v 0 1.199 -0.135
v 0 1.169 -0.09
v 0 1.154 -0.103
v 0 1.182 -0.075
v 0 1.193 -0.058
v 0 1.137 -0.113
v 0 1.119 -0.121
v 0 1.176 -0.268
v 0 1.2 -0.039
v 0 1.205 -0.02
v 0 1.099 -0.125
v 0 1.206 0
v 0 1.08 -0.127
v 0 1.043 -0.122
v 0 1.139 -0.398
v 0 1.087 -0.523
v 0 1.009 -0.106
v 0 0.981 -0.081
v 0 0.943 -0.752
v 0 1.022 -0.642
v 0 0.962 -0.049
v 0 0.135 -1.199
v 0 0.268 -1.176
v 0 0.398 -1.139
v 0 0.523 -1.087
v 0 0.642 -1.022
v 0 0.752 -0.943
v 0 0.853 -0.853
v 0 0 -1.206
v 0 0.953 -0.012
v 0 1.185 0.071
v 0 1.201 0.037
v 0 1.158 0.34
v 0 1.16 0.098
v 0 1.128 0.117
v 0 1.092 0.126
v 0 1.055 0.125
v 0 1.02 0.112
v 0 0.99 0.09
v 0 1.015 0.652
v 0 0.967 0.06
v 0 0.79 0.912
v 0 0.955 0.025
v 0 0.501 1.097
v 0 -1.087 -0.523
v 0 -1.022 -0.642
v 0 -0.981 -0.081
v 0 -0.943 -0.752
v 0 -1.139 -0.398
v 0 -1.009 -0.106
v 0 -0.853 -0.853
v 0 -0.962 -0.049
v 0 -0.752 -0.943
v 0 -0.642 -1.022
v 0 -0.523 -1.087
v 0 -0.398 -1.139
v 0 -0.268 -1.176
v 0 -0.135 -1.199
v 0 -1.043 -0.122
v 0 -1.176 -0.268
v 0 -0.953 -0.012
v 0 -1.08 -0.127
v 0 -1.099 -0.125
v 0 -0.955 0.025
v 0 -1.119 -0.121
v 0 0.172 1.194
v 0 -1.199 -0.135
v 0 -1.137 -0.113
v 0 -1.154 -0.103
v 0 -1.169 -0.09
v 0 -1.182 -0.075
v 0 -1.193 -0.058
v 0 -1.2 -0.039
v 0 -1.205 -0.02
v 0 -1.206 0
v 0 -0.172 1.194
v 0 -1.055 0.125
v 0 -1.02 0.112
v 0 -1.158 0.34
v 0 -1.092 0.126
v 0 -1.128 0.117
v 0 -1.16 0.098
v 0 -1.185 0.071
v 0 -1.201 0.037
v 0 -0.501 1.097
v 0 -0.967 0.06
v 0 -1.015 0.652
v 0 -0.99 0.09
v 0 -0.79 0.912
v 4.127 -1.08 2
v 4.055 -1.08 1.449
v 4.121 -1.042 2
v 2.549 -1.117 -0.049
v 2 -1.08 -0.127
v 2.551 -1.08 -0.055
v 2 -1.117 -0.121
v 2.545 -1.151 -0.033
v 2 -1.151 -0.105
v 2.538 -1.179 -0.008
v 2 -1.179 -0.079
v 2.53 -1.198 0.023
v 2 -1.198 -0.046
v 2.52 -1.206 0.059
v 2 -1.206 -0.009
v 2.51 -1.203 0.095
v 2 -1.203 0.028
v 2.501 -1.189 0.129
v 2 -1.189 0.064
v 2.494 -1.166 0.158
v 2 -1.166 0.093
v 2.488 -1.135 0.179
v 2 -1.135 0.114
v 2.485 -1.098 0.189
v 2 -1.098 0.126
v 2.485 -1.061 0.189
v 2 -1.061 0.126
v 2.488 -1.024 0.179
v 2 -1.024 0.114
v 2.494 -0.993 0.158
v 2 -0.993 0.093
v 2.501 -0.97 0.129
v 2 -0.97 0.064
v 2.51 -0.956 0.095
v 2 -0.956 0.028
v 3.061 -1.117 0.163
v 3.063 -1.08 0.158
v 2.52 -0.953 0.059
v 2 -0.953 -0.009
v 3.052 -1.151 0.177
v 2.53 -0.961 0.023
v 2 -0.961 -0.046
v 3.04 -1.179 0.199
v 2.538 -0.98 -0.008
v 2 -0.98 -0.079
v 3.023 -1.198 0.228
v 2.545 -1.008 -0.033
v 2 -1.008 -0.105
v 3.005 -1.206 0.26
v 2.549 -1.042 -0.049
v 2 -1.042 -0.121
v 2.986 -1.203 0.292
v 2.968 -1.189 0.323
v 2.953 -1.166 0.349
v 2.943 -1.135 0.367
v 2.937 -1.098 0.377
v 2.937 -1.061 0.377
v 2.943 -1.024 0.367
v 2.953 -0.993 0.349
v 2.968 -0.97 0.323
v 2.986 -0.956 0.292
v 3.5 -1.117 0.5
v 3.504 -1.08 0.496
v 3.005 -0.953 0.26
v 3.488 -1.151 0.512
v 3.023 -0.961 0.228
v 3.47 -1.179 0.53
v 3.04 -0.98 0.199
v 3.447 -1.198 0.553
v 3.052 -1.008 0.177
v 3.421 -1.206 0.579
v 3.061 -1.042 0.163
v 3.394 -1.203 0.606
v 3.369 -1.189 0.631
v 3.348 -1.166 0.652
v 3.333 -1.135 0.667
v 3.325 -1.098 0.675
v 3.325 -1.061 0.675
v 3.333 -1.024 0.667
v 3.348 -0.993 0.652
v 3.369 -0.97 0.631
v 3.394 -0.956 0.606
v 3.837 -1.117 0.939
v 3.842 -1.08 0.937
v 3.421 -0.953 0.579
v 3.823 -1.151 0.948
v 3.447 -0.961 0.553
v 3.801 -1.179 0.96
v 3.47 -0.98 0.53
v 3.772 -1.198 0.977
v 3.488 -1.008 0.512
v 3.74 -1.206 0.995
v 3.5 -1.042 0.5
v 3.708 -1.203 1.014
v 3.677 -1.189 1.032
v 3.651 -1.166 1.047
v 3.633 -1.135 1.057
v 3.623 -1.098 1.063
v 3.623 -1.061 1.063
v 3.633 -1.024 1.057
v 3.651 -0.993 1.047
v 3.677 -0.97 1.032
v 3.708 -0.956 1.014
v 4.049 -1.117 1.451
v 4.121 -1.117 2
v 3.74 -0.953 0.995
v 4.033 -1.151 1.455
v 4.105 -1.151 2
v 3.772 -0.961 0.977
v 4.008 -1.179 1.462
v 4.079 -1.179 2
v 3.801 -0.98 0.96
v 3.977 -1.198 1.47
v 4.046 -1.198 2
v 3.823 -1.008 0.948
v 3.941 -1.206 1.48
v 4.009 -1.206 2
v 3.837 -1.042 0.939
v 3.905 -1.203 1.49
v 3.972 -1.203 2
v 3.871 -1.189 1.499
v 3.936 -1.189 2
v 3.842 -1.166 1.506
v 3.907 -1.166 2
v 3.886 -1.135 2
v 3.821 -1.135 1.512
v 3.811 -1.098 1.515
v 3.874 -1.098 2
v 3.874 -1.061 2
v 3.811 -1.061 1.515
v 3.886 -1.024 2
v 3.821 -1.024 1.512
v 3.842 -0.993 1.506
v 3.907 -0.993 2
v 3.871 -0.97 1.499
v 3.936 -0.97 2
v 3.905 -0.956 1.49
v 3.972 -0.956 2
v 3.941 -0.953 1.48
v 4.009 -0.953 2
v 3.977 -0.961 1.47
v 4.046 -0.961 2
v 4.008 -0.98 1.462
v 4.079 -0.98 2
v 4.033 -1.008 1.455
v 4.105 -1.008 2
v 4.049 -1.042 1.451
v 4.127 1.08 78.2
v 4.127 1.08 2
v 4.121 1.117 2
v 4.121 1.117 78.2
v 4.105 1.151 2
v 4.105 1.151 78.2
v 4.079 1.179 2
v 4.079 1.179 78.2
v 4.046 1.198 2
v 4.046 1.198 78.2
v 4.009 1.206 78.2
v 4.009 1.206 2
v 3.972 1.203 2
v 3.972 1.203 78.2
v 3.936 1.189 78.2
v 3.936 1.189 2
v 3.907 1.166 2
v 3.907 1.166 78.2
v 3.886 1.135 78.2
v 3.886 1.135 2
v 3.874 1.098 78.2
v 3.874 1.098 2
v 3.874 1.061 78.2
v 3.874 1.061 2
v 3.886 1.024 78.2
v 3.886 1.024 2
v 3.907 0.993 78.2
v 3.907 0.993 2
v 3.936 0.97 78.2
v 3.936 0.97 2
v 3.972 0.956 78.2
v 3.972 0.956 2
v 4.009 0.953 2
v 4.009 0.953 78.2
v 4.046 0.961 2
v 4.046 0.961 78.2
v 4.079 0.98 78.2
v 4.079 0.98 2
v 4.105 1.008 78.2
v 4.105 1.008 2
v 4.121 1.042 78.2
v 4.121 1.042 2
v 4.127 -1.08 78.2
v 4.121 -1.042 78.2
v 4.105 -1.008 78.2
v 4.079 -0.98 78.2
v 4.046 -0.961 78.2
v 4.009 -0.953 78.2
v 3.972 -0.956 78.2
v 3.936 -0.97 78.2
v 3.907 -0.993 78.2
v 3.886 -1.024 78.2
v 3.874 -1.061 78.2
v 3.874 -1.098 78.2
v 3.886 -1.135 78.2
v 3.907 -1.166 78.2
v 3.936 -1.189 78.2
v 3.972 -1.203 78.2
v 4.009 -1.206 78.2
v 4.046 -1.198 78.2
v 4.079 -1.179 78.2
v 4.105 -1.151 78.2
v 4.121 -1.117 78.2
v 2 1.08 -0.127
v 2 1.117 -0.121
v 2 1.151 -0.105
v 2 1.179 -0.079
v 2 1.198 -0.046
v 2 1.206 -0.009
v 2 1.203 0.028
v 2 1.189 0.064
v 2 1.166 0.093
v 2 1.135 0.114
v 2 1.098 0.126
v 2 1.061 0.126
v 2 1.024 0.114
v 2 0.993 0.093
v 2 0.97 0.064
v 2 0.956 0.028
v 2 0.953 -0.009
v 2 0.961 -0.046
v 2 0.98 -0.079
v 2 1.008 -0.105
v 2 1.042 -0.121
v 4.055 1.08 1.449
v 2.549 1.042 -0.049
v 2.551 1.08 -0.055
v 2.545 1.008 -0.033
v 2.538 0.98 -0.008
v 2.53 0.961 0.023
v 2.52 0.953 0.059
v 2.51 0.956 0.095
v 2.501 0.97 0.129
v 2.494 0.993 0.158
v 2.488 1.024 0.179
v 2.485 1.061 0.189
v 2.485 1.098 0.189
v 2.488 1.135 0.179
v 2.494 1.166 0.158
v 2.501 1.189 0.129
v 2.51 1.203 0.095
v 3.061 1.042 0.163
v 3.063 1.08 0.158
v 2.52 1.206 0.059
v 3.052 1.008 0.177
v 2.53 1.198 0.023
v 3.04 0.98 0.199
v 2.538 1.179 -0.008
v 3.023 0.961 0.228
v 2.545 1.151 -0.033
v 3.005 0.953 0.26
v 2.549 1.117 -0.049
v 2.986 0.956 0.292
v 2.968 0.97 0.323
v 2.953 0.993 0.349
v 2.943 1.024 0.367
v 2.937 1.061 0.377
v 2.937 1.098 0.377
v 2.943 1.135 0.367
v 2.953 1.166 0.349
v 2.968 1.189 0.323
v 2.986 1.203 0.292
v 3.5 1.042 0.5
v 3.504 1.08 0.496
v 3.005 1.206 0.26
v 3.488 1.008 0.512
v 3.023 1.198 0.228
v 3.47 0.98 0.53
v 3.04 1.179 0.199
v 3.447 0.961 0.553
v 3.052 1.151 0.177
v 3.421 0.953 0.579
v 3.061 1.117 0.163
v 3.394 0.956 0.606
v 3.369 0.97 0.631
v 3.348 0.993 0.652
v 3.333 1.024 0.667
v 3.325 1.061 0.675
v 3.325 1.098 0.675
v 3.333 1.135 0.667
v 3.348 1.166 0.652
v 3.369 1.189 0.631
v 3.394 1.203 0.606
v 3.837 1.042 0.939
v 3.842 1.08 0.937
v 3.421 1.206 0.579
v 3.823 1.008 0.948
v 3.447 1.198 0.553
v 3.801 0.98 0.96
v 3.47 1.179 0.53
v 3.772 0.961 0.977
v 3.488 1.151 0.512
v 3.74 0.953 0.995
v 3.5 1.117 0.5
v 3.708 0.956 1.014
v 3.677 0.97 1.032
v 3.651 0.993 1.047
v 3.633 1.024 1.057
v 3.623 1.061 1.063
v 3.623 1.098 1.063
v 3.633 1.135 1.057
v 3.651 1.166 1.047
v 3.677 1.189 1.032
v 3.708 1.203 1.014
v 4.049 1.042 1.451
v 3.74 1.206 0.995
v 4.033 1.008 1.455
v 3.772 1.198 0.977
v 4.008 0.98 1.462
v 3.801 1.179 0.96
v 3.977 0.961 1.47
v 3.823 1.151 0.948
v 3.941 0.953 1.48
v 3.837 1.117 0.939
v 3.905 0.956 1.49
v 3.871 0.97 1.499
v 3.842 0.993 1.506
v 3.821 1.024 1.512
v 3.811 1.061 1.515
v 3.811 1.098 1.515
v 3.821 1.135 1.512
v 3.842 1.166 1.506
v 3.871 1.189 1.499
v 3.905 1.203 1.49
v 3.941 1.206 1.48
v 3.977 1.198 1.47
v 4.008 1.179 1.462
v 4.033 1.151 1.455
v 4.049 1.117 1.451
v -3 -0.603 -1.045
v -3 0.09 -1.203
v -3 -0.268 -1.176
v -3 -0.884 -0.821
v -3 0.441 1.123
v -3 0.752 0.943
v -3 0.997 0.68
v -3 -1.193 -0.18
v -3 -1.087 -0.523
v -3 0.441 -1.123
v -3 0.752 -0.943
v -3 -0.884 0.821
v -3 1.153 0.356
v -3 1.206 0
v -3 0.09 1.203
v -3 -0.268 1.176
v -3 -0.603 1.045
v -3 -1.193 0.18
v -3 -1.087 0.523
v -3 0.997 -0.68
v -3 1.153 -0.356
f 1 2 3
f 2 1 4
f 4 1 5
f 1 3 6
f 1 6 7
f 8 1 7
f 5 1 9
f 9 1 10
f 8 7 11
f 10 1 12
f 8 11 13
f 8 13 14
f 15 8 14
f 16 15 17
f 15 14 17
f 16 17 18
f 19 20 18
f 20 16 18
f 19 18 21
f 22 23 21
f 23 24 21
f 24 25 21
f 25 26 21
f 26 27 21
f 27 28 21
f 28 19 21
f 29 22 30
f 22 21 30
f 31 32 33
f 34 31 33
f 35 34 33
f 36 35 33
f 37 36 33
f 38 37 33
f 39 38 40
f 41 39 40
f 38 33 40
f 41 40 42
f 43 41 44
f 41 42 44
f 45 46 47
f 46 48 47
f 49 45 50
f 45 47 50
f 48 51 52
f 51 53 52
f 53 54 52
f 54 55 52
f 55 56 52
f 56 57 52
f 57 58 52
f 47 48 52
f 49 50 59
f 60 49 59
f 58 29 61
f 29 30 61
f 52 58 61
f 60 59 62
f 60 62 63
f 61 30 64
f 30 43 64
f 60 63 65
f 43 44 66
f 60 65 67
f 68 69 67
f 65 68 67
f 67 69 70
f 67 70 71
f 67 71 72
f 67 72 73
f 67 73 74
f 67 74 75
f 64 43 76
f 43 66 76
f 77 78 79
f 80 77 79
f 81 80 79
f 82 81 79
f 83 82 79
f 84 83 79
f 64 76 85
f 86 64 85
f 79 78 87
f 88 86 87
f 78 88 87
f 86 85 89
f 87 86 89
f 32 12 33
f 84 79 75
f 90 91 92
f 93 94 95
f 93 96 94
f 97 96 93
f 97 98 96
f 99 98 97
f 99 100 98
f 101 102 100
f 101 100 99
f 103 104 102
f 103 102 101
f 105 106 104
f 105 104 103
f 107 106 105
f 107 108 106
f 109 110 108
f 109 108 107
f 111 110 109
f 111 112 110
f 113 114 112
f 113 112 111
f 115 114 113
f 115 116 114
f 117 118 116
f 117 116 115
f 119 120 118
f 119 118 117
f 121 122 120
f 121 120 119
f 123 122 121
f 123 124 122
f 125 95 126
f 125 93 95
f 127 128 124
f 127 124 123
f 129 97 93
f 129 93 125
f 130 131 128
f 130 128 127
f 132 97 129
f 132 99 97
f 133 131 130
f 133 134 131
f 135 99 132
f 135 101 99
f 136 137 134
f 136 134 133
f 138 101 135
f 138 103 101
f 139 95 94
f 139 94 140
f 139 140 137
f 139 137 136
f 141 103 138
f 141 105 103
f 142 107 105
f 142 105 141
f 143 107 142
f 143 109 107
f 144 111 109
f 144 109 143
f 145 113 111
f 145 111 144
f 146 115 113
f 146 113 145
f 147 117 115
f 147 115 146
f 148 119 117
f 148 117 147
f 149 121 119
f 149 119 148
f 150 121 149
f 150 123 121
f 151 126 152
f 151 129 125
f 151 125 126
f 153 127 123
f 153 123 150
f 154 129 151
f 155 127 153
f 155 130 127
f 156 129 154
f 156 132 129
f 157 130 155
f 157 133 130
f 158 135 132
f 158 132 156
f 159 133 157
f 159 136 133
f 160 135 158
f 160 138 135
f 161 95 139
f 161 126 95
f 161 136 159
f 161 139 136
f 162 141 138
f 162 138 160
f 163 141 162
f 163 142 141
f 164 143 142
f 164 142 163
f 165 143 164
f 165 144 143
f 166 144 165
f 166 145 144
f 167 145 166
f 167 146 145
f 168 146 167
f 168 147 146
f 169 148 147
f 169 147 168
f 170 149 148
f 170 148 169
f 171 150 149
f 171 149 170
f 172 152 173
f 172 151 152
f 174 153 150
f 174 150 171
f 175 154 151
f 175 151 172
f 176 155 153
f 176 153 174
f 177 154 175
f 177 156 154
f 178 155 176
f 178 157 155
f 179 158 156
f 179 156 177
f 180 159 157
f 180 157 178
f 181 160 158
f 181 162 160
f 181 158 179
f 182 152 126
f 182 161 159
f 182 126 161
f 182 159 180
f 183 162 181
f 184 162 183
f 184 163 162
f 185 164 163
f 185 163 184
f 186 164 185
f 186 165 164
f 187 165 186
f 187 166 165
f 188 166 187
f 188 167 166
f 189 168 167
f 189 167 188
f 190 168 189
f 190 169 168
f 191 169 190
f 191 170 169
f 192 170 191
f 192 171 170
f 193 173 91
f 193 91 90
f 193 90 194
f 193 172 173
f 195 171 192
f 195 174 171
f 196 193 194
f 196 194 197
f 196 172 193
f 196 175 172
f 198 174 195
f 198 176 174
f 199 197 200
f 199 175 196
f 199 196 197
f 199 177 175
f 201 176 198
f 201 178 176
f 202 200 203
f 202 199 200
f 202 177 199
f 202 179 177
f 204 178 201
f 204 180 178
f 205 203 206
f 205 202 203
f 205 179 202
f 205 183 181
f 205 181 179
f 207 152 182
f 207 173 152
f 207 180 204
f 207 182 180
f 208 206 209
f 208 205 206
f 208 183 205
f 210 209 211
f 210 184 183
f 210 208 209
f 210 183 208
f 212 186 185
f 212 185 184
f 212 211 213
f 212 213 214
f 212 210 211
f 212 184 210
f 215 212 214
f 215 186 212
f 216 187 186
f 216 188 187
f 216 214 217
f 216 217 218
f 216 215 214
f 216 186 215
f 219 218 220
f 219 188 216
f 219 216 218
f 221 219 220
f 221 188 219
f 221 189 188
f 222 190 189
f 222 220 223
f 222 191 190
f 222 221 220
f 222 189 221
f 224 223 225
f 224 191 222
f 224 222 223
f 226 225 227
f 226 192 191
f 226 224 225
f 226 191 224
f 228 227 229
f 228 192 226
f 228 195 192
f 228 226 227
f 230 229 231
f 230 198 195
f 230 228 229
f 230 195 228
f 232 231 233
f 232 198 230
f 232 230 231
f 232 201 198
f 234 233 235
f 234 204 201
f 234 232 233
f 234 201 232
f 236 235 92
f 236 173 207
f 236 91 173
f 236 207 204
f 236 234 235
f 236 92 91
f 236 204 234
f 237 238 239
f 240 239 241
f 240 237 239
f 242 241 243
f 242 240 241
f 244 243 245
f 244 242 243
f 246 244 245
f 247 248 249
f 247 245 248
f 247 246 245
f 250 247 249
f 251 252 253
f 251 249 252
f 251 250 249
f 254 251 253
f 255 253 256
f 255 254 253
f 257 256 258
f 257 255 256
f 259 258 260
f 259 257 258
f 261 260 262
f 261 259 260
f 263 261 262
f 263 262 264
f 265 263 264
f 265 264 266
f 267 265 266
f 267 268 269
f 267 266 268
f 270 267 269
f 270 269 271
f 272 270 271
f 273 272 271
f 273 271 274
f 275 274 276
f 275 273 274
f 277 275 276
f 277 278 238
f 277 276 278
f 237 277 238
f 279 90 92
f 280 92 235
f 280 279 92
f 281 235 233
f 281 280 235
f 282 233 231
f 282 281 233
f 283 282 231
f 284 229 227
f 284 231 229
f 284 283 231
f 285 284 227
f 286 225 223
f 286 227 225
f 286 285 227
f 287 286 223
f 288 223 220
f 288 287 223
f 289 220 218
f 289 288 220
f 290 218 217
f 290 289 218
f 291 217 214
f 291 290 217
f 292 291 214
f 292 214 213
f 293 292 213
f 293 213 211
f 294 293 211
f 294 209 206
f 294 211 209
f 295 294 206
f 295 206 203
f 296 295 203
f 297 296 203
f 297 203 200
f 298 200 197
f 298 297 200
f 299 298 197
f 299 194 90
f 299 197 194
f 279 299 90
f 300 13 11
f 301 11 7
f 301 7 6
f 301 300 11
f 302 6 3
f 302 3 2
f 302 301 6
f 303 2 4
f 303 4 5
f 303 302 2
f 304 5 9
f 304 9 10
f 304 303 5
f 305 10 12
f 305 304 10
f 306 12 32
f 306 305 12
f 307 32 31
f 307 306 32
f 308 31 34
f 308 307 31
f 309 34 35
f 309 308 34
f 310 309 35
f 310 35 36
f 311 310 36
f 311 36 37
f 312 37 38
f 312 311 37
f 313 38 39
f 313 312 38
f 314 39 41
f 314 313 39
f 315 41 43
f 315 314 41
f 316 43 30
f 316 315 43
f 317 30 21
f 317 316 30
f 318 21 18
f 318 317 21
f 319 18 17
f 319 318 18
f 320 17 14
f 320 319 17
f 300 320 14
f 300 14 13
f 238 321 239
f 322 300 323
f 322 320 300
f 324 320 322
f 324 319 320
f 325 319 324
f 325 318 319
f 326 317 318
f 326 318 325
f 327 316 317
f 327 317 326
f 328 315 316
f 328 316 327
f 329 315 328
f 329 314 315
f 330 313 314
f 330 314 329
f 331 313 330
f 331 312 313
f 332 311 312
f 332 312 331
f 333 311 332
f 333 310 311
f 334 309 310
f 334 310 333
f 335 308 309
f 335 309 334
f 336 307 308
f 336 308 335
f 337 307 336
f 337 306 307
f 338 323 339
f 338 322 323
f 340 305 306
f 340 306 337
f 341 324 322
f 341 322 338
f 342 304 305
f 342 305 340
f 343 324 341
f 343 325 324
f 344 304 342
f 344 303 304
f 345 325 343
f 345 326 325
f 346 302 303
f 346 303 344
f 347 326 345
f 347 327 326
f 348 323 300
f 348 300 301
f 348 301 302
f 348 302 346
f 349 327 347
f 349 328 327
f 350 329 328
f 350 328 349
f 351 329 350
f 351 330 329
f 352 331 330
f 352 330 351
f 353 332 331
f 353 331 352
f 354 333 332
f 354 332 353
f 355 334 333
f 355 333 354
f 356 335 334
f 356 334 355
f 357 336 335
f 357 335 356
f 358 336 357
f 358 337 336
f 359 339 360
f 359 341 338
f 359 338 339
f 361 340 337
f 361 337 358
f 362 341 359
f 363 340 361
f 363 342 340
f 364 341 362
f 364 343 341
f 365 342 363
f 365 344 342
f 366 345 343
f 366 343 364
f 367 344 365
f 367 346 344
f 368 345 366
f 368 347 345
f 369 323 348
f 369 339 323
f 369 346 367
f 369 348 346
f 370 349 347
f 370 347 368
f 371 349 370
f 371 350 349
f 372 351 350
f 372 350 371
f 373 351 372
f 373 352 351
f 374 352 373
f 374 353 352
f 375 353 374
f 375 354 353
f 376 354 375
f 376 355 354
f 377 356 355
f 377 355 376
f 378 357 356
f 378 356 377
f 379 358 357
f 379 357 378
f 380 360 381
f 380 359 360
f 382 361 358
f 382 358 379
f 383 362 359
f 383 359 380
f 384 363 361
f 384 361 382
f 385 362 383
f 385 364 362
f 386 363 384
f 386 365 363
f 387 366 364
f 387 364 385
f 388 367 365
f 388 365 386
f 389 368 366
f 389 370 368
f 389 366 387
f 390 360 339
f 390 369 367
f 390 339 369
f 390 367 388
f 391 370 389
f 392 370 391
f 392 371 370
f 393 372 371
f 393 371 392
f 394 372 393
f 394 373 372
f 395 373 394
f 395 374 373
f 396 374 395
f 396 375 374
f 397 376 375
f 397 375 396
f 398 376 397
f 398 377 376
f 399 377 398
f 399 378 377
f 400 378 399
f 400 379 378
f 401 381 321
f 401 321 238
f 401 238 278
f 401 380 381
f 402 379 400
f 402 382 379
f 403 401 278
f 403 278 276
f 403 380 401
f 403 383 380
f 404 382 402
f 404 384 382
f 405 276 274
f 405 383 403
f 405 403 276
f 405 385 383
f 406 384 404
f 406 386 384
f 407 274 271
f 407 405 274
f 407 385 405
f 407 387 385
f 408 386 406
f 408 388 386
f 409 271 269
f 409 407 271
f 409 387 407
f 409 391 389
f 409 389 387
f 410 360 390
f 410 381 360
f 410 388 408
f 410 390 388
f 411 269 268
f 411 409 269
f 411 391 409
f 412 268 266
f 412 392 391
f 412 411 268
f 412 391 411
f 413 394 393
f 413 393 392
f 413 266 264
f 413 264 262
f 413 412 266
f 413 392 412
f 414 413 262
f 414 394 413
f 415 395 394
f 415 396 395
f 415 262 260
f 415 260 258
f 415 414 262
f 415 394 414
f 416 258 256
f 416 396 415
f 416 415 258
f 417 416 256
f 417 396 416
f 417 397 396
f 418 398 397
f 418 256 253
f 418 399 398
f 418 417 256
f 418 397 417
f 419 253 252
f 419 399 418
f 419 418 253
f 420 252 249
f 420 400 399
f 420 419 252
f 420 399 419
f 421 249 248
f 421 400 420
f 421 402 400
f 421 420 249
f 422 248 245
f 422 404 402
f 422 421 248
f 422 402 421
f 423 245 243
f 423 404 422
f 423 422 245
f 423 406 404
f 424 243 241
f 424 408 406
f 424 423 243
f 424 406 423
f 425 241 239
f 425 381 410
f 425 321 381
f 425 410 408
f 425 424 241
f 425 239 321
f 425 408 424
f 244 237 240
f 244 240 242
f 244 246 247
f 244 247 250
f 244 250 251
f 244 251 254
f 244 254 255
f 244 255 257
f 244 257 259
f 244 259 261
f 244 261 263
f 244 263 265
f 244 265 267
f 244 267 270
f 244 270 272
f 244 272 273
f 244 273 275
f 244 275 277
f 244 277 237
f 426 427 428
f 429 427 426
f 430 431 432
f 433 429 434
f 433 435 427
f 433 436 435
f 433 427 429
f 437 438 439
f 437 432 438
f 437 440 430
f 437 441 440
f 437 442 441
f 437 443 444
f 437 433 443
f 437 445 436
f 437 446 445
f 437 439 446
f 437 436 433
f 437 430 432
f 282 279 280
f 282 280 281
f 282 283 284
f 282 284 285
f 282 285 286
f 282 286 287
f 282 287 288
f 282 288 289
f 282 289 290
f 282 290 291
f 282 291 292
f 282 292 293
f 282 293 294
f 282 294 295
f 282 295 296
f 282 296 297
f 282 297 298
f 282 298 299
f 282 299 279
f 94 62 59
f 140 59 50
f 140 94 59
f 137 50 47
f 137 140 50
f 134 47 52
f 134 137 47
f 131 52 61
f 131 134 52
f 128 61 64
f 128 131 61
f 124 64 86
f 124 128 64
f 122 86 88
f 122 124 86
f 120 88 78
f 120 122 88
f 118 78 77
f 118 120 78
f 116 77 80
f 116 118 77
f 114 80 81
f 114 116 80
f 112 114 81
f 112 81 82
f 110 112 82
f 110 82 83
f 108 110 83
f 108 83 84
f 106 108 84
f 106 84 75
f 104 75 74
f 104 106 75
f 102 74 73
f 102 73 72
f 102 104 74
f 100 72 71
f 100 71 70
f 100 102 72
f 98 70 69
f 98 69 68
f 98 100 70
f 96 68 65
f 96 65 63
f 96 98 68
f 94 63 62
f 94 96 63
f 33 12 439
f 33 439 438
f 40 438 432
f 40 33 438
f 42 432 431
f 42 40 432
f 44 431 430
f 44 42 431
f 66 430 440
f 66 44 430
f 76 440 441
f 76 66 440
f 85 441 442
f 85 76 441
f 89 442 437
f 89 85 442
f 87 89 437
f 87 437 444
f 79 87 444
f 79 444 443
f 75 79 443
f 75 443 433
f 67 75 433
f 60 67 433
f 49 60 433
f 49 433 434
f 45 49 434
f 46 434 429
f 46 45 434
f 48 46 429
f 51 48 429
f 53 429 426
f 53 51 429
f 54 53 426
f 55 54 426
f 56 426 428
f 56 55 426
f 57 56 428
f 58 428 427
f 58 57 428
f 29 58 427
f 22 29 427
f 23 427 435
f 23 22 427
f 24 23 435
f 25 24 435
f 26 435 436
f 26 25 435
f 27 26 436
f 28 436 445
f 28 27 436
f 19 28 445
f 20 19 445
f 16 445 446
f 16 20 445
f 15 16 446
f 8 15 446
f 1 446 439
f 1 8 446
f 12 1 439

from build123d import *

# Parameters (mm, degrees)
SKETCH1_W = 3
SKETCH1_H = 1.2065
SKETCH2_R = 0.127


with BuildPart() as part:
    # Sketch1 → Revolve1 (revolve)
    with BuildSketch(Plane.XY):
        with Locations((-1.5, 0.60325)):
            Rectangle(SKETCH1_W, SKETCH1_H)
    revolve(axis=Axis((0, 0, 0), (1, 0, 0)))

    # Sweep1: sweep along a path in Sketch3
    with BuildLine(Plane(origin=(0, 0, 0), x_dir=(1, 0, 0), z_dir=(0, 1, 0))) as sweep1_path:
        Line((0, 0), (2, 0))
        ThreePointArc((2, 0), (3.414213562, -0.585786438), (4, -2))
        Line((4, -2), (4, -78.2))
    # Sketch2 → Sweep1 (sweep)
    with BuildSketch(Plane(origin=(0, 0, 0), x_dir=(0, 0, -1), z_dir=(1, 0, 0))):
        with Locations((0, 1.0795)):
            Circle(SKETCH2_R)
        with Locations((0, -1.0795)):
            Circle(SKETCH2_R)
    sweep(path=sweep1_path.line)


solid = part.part
